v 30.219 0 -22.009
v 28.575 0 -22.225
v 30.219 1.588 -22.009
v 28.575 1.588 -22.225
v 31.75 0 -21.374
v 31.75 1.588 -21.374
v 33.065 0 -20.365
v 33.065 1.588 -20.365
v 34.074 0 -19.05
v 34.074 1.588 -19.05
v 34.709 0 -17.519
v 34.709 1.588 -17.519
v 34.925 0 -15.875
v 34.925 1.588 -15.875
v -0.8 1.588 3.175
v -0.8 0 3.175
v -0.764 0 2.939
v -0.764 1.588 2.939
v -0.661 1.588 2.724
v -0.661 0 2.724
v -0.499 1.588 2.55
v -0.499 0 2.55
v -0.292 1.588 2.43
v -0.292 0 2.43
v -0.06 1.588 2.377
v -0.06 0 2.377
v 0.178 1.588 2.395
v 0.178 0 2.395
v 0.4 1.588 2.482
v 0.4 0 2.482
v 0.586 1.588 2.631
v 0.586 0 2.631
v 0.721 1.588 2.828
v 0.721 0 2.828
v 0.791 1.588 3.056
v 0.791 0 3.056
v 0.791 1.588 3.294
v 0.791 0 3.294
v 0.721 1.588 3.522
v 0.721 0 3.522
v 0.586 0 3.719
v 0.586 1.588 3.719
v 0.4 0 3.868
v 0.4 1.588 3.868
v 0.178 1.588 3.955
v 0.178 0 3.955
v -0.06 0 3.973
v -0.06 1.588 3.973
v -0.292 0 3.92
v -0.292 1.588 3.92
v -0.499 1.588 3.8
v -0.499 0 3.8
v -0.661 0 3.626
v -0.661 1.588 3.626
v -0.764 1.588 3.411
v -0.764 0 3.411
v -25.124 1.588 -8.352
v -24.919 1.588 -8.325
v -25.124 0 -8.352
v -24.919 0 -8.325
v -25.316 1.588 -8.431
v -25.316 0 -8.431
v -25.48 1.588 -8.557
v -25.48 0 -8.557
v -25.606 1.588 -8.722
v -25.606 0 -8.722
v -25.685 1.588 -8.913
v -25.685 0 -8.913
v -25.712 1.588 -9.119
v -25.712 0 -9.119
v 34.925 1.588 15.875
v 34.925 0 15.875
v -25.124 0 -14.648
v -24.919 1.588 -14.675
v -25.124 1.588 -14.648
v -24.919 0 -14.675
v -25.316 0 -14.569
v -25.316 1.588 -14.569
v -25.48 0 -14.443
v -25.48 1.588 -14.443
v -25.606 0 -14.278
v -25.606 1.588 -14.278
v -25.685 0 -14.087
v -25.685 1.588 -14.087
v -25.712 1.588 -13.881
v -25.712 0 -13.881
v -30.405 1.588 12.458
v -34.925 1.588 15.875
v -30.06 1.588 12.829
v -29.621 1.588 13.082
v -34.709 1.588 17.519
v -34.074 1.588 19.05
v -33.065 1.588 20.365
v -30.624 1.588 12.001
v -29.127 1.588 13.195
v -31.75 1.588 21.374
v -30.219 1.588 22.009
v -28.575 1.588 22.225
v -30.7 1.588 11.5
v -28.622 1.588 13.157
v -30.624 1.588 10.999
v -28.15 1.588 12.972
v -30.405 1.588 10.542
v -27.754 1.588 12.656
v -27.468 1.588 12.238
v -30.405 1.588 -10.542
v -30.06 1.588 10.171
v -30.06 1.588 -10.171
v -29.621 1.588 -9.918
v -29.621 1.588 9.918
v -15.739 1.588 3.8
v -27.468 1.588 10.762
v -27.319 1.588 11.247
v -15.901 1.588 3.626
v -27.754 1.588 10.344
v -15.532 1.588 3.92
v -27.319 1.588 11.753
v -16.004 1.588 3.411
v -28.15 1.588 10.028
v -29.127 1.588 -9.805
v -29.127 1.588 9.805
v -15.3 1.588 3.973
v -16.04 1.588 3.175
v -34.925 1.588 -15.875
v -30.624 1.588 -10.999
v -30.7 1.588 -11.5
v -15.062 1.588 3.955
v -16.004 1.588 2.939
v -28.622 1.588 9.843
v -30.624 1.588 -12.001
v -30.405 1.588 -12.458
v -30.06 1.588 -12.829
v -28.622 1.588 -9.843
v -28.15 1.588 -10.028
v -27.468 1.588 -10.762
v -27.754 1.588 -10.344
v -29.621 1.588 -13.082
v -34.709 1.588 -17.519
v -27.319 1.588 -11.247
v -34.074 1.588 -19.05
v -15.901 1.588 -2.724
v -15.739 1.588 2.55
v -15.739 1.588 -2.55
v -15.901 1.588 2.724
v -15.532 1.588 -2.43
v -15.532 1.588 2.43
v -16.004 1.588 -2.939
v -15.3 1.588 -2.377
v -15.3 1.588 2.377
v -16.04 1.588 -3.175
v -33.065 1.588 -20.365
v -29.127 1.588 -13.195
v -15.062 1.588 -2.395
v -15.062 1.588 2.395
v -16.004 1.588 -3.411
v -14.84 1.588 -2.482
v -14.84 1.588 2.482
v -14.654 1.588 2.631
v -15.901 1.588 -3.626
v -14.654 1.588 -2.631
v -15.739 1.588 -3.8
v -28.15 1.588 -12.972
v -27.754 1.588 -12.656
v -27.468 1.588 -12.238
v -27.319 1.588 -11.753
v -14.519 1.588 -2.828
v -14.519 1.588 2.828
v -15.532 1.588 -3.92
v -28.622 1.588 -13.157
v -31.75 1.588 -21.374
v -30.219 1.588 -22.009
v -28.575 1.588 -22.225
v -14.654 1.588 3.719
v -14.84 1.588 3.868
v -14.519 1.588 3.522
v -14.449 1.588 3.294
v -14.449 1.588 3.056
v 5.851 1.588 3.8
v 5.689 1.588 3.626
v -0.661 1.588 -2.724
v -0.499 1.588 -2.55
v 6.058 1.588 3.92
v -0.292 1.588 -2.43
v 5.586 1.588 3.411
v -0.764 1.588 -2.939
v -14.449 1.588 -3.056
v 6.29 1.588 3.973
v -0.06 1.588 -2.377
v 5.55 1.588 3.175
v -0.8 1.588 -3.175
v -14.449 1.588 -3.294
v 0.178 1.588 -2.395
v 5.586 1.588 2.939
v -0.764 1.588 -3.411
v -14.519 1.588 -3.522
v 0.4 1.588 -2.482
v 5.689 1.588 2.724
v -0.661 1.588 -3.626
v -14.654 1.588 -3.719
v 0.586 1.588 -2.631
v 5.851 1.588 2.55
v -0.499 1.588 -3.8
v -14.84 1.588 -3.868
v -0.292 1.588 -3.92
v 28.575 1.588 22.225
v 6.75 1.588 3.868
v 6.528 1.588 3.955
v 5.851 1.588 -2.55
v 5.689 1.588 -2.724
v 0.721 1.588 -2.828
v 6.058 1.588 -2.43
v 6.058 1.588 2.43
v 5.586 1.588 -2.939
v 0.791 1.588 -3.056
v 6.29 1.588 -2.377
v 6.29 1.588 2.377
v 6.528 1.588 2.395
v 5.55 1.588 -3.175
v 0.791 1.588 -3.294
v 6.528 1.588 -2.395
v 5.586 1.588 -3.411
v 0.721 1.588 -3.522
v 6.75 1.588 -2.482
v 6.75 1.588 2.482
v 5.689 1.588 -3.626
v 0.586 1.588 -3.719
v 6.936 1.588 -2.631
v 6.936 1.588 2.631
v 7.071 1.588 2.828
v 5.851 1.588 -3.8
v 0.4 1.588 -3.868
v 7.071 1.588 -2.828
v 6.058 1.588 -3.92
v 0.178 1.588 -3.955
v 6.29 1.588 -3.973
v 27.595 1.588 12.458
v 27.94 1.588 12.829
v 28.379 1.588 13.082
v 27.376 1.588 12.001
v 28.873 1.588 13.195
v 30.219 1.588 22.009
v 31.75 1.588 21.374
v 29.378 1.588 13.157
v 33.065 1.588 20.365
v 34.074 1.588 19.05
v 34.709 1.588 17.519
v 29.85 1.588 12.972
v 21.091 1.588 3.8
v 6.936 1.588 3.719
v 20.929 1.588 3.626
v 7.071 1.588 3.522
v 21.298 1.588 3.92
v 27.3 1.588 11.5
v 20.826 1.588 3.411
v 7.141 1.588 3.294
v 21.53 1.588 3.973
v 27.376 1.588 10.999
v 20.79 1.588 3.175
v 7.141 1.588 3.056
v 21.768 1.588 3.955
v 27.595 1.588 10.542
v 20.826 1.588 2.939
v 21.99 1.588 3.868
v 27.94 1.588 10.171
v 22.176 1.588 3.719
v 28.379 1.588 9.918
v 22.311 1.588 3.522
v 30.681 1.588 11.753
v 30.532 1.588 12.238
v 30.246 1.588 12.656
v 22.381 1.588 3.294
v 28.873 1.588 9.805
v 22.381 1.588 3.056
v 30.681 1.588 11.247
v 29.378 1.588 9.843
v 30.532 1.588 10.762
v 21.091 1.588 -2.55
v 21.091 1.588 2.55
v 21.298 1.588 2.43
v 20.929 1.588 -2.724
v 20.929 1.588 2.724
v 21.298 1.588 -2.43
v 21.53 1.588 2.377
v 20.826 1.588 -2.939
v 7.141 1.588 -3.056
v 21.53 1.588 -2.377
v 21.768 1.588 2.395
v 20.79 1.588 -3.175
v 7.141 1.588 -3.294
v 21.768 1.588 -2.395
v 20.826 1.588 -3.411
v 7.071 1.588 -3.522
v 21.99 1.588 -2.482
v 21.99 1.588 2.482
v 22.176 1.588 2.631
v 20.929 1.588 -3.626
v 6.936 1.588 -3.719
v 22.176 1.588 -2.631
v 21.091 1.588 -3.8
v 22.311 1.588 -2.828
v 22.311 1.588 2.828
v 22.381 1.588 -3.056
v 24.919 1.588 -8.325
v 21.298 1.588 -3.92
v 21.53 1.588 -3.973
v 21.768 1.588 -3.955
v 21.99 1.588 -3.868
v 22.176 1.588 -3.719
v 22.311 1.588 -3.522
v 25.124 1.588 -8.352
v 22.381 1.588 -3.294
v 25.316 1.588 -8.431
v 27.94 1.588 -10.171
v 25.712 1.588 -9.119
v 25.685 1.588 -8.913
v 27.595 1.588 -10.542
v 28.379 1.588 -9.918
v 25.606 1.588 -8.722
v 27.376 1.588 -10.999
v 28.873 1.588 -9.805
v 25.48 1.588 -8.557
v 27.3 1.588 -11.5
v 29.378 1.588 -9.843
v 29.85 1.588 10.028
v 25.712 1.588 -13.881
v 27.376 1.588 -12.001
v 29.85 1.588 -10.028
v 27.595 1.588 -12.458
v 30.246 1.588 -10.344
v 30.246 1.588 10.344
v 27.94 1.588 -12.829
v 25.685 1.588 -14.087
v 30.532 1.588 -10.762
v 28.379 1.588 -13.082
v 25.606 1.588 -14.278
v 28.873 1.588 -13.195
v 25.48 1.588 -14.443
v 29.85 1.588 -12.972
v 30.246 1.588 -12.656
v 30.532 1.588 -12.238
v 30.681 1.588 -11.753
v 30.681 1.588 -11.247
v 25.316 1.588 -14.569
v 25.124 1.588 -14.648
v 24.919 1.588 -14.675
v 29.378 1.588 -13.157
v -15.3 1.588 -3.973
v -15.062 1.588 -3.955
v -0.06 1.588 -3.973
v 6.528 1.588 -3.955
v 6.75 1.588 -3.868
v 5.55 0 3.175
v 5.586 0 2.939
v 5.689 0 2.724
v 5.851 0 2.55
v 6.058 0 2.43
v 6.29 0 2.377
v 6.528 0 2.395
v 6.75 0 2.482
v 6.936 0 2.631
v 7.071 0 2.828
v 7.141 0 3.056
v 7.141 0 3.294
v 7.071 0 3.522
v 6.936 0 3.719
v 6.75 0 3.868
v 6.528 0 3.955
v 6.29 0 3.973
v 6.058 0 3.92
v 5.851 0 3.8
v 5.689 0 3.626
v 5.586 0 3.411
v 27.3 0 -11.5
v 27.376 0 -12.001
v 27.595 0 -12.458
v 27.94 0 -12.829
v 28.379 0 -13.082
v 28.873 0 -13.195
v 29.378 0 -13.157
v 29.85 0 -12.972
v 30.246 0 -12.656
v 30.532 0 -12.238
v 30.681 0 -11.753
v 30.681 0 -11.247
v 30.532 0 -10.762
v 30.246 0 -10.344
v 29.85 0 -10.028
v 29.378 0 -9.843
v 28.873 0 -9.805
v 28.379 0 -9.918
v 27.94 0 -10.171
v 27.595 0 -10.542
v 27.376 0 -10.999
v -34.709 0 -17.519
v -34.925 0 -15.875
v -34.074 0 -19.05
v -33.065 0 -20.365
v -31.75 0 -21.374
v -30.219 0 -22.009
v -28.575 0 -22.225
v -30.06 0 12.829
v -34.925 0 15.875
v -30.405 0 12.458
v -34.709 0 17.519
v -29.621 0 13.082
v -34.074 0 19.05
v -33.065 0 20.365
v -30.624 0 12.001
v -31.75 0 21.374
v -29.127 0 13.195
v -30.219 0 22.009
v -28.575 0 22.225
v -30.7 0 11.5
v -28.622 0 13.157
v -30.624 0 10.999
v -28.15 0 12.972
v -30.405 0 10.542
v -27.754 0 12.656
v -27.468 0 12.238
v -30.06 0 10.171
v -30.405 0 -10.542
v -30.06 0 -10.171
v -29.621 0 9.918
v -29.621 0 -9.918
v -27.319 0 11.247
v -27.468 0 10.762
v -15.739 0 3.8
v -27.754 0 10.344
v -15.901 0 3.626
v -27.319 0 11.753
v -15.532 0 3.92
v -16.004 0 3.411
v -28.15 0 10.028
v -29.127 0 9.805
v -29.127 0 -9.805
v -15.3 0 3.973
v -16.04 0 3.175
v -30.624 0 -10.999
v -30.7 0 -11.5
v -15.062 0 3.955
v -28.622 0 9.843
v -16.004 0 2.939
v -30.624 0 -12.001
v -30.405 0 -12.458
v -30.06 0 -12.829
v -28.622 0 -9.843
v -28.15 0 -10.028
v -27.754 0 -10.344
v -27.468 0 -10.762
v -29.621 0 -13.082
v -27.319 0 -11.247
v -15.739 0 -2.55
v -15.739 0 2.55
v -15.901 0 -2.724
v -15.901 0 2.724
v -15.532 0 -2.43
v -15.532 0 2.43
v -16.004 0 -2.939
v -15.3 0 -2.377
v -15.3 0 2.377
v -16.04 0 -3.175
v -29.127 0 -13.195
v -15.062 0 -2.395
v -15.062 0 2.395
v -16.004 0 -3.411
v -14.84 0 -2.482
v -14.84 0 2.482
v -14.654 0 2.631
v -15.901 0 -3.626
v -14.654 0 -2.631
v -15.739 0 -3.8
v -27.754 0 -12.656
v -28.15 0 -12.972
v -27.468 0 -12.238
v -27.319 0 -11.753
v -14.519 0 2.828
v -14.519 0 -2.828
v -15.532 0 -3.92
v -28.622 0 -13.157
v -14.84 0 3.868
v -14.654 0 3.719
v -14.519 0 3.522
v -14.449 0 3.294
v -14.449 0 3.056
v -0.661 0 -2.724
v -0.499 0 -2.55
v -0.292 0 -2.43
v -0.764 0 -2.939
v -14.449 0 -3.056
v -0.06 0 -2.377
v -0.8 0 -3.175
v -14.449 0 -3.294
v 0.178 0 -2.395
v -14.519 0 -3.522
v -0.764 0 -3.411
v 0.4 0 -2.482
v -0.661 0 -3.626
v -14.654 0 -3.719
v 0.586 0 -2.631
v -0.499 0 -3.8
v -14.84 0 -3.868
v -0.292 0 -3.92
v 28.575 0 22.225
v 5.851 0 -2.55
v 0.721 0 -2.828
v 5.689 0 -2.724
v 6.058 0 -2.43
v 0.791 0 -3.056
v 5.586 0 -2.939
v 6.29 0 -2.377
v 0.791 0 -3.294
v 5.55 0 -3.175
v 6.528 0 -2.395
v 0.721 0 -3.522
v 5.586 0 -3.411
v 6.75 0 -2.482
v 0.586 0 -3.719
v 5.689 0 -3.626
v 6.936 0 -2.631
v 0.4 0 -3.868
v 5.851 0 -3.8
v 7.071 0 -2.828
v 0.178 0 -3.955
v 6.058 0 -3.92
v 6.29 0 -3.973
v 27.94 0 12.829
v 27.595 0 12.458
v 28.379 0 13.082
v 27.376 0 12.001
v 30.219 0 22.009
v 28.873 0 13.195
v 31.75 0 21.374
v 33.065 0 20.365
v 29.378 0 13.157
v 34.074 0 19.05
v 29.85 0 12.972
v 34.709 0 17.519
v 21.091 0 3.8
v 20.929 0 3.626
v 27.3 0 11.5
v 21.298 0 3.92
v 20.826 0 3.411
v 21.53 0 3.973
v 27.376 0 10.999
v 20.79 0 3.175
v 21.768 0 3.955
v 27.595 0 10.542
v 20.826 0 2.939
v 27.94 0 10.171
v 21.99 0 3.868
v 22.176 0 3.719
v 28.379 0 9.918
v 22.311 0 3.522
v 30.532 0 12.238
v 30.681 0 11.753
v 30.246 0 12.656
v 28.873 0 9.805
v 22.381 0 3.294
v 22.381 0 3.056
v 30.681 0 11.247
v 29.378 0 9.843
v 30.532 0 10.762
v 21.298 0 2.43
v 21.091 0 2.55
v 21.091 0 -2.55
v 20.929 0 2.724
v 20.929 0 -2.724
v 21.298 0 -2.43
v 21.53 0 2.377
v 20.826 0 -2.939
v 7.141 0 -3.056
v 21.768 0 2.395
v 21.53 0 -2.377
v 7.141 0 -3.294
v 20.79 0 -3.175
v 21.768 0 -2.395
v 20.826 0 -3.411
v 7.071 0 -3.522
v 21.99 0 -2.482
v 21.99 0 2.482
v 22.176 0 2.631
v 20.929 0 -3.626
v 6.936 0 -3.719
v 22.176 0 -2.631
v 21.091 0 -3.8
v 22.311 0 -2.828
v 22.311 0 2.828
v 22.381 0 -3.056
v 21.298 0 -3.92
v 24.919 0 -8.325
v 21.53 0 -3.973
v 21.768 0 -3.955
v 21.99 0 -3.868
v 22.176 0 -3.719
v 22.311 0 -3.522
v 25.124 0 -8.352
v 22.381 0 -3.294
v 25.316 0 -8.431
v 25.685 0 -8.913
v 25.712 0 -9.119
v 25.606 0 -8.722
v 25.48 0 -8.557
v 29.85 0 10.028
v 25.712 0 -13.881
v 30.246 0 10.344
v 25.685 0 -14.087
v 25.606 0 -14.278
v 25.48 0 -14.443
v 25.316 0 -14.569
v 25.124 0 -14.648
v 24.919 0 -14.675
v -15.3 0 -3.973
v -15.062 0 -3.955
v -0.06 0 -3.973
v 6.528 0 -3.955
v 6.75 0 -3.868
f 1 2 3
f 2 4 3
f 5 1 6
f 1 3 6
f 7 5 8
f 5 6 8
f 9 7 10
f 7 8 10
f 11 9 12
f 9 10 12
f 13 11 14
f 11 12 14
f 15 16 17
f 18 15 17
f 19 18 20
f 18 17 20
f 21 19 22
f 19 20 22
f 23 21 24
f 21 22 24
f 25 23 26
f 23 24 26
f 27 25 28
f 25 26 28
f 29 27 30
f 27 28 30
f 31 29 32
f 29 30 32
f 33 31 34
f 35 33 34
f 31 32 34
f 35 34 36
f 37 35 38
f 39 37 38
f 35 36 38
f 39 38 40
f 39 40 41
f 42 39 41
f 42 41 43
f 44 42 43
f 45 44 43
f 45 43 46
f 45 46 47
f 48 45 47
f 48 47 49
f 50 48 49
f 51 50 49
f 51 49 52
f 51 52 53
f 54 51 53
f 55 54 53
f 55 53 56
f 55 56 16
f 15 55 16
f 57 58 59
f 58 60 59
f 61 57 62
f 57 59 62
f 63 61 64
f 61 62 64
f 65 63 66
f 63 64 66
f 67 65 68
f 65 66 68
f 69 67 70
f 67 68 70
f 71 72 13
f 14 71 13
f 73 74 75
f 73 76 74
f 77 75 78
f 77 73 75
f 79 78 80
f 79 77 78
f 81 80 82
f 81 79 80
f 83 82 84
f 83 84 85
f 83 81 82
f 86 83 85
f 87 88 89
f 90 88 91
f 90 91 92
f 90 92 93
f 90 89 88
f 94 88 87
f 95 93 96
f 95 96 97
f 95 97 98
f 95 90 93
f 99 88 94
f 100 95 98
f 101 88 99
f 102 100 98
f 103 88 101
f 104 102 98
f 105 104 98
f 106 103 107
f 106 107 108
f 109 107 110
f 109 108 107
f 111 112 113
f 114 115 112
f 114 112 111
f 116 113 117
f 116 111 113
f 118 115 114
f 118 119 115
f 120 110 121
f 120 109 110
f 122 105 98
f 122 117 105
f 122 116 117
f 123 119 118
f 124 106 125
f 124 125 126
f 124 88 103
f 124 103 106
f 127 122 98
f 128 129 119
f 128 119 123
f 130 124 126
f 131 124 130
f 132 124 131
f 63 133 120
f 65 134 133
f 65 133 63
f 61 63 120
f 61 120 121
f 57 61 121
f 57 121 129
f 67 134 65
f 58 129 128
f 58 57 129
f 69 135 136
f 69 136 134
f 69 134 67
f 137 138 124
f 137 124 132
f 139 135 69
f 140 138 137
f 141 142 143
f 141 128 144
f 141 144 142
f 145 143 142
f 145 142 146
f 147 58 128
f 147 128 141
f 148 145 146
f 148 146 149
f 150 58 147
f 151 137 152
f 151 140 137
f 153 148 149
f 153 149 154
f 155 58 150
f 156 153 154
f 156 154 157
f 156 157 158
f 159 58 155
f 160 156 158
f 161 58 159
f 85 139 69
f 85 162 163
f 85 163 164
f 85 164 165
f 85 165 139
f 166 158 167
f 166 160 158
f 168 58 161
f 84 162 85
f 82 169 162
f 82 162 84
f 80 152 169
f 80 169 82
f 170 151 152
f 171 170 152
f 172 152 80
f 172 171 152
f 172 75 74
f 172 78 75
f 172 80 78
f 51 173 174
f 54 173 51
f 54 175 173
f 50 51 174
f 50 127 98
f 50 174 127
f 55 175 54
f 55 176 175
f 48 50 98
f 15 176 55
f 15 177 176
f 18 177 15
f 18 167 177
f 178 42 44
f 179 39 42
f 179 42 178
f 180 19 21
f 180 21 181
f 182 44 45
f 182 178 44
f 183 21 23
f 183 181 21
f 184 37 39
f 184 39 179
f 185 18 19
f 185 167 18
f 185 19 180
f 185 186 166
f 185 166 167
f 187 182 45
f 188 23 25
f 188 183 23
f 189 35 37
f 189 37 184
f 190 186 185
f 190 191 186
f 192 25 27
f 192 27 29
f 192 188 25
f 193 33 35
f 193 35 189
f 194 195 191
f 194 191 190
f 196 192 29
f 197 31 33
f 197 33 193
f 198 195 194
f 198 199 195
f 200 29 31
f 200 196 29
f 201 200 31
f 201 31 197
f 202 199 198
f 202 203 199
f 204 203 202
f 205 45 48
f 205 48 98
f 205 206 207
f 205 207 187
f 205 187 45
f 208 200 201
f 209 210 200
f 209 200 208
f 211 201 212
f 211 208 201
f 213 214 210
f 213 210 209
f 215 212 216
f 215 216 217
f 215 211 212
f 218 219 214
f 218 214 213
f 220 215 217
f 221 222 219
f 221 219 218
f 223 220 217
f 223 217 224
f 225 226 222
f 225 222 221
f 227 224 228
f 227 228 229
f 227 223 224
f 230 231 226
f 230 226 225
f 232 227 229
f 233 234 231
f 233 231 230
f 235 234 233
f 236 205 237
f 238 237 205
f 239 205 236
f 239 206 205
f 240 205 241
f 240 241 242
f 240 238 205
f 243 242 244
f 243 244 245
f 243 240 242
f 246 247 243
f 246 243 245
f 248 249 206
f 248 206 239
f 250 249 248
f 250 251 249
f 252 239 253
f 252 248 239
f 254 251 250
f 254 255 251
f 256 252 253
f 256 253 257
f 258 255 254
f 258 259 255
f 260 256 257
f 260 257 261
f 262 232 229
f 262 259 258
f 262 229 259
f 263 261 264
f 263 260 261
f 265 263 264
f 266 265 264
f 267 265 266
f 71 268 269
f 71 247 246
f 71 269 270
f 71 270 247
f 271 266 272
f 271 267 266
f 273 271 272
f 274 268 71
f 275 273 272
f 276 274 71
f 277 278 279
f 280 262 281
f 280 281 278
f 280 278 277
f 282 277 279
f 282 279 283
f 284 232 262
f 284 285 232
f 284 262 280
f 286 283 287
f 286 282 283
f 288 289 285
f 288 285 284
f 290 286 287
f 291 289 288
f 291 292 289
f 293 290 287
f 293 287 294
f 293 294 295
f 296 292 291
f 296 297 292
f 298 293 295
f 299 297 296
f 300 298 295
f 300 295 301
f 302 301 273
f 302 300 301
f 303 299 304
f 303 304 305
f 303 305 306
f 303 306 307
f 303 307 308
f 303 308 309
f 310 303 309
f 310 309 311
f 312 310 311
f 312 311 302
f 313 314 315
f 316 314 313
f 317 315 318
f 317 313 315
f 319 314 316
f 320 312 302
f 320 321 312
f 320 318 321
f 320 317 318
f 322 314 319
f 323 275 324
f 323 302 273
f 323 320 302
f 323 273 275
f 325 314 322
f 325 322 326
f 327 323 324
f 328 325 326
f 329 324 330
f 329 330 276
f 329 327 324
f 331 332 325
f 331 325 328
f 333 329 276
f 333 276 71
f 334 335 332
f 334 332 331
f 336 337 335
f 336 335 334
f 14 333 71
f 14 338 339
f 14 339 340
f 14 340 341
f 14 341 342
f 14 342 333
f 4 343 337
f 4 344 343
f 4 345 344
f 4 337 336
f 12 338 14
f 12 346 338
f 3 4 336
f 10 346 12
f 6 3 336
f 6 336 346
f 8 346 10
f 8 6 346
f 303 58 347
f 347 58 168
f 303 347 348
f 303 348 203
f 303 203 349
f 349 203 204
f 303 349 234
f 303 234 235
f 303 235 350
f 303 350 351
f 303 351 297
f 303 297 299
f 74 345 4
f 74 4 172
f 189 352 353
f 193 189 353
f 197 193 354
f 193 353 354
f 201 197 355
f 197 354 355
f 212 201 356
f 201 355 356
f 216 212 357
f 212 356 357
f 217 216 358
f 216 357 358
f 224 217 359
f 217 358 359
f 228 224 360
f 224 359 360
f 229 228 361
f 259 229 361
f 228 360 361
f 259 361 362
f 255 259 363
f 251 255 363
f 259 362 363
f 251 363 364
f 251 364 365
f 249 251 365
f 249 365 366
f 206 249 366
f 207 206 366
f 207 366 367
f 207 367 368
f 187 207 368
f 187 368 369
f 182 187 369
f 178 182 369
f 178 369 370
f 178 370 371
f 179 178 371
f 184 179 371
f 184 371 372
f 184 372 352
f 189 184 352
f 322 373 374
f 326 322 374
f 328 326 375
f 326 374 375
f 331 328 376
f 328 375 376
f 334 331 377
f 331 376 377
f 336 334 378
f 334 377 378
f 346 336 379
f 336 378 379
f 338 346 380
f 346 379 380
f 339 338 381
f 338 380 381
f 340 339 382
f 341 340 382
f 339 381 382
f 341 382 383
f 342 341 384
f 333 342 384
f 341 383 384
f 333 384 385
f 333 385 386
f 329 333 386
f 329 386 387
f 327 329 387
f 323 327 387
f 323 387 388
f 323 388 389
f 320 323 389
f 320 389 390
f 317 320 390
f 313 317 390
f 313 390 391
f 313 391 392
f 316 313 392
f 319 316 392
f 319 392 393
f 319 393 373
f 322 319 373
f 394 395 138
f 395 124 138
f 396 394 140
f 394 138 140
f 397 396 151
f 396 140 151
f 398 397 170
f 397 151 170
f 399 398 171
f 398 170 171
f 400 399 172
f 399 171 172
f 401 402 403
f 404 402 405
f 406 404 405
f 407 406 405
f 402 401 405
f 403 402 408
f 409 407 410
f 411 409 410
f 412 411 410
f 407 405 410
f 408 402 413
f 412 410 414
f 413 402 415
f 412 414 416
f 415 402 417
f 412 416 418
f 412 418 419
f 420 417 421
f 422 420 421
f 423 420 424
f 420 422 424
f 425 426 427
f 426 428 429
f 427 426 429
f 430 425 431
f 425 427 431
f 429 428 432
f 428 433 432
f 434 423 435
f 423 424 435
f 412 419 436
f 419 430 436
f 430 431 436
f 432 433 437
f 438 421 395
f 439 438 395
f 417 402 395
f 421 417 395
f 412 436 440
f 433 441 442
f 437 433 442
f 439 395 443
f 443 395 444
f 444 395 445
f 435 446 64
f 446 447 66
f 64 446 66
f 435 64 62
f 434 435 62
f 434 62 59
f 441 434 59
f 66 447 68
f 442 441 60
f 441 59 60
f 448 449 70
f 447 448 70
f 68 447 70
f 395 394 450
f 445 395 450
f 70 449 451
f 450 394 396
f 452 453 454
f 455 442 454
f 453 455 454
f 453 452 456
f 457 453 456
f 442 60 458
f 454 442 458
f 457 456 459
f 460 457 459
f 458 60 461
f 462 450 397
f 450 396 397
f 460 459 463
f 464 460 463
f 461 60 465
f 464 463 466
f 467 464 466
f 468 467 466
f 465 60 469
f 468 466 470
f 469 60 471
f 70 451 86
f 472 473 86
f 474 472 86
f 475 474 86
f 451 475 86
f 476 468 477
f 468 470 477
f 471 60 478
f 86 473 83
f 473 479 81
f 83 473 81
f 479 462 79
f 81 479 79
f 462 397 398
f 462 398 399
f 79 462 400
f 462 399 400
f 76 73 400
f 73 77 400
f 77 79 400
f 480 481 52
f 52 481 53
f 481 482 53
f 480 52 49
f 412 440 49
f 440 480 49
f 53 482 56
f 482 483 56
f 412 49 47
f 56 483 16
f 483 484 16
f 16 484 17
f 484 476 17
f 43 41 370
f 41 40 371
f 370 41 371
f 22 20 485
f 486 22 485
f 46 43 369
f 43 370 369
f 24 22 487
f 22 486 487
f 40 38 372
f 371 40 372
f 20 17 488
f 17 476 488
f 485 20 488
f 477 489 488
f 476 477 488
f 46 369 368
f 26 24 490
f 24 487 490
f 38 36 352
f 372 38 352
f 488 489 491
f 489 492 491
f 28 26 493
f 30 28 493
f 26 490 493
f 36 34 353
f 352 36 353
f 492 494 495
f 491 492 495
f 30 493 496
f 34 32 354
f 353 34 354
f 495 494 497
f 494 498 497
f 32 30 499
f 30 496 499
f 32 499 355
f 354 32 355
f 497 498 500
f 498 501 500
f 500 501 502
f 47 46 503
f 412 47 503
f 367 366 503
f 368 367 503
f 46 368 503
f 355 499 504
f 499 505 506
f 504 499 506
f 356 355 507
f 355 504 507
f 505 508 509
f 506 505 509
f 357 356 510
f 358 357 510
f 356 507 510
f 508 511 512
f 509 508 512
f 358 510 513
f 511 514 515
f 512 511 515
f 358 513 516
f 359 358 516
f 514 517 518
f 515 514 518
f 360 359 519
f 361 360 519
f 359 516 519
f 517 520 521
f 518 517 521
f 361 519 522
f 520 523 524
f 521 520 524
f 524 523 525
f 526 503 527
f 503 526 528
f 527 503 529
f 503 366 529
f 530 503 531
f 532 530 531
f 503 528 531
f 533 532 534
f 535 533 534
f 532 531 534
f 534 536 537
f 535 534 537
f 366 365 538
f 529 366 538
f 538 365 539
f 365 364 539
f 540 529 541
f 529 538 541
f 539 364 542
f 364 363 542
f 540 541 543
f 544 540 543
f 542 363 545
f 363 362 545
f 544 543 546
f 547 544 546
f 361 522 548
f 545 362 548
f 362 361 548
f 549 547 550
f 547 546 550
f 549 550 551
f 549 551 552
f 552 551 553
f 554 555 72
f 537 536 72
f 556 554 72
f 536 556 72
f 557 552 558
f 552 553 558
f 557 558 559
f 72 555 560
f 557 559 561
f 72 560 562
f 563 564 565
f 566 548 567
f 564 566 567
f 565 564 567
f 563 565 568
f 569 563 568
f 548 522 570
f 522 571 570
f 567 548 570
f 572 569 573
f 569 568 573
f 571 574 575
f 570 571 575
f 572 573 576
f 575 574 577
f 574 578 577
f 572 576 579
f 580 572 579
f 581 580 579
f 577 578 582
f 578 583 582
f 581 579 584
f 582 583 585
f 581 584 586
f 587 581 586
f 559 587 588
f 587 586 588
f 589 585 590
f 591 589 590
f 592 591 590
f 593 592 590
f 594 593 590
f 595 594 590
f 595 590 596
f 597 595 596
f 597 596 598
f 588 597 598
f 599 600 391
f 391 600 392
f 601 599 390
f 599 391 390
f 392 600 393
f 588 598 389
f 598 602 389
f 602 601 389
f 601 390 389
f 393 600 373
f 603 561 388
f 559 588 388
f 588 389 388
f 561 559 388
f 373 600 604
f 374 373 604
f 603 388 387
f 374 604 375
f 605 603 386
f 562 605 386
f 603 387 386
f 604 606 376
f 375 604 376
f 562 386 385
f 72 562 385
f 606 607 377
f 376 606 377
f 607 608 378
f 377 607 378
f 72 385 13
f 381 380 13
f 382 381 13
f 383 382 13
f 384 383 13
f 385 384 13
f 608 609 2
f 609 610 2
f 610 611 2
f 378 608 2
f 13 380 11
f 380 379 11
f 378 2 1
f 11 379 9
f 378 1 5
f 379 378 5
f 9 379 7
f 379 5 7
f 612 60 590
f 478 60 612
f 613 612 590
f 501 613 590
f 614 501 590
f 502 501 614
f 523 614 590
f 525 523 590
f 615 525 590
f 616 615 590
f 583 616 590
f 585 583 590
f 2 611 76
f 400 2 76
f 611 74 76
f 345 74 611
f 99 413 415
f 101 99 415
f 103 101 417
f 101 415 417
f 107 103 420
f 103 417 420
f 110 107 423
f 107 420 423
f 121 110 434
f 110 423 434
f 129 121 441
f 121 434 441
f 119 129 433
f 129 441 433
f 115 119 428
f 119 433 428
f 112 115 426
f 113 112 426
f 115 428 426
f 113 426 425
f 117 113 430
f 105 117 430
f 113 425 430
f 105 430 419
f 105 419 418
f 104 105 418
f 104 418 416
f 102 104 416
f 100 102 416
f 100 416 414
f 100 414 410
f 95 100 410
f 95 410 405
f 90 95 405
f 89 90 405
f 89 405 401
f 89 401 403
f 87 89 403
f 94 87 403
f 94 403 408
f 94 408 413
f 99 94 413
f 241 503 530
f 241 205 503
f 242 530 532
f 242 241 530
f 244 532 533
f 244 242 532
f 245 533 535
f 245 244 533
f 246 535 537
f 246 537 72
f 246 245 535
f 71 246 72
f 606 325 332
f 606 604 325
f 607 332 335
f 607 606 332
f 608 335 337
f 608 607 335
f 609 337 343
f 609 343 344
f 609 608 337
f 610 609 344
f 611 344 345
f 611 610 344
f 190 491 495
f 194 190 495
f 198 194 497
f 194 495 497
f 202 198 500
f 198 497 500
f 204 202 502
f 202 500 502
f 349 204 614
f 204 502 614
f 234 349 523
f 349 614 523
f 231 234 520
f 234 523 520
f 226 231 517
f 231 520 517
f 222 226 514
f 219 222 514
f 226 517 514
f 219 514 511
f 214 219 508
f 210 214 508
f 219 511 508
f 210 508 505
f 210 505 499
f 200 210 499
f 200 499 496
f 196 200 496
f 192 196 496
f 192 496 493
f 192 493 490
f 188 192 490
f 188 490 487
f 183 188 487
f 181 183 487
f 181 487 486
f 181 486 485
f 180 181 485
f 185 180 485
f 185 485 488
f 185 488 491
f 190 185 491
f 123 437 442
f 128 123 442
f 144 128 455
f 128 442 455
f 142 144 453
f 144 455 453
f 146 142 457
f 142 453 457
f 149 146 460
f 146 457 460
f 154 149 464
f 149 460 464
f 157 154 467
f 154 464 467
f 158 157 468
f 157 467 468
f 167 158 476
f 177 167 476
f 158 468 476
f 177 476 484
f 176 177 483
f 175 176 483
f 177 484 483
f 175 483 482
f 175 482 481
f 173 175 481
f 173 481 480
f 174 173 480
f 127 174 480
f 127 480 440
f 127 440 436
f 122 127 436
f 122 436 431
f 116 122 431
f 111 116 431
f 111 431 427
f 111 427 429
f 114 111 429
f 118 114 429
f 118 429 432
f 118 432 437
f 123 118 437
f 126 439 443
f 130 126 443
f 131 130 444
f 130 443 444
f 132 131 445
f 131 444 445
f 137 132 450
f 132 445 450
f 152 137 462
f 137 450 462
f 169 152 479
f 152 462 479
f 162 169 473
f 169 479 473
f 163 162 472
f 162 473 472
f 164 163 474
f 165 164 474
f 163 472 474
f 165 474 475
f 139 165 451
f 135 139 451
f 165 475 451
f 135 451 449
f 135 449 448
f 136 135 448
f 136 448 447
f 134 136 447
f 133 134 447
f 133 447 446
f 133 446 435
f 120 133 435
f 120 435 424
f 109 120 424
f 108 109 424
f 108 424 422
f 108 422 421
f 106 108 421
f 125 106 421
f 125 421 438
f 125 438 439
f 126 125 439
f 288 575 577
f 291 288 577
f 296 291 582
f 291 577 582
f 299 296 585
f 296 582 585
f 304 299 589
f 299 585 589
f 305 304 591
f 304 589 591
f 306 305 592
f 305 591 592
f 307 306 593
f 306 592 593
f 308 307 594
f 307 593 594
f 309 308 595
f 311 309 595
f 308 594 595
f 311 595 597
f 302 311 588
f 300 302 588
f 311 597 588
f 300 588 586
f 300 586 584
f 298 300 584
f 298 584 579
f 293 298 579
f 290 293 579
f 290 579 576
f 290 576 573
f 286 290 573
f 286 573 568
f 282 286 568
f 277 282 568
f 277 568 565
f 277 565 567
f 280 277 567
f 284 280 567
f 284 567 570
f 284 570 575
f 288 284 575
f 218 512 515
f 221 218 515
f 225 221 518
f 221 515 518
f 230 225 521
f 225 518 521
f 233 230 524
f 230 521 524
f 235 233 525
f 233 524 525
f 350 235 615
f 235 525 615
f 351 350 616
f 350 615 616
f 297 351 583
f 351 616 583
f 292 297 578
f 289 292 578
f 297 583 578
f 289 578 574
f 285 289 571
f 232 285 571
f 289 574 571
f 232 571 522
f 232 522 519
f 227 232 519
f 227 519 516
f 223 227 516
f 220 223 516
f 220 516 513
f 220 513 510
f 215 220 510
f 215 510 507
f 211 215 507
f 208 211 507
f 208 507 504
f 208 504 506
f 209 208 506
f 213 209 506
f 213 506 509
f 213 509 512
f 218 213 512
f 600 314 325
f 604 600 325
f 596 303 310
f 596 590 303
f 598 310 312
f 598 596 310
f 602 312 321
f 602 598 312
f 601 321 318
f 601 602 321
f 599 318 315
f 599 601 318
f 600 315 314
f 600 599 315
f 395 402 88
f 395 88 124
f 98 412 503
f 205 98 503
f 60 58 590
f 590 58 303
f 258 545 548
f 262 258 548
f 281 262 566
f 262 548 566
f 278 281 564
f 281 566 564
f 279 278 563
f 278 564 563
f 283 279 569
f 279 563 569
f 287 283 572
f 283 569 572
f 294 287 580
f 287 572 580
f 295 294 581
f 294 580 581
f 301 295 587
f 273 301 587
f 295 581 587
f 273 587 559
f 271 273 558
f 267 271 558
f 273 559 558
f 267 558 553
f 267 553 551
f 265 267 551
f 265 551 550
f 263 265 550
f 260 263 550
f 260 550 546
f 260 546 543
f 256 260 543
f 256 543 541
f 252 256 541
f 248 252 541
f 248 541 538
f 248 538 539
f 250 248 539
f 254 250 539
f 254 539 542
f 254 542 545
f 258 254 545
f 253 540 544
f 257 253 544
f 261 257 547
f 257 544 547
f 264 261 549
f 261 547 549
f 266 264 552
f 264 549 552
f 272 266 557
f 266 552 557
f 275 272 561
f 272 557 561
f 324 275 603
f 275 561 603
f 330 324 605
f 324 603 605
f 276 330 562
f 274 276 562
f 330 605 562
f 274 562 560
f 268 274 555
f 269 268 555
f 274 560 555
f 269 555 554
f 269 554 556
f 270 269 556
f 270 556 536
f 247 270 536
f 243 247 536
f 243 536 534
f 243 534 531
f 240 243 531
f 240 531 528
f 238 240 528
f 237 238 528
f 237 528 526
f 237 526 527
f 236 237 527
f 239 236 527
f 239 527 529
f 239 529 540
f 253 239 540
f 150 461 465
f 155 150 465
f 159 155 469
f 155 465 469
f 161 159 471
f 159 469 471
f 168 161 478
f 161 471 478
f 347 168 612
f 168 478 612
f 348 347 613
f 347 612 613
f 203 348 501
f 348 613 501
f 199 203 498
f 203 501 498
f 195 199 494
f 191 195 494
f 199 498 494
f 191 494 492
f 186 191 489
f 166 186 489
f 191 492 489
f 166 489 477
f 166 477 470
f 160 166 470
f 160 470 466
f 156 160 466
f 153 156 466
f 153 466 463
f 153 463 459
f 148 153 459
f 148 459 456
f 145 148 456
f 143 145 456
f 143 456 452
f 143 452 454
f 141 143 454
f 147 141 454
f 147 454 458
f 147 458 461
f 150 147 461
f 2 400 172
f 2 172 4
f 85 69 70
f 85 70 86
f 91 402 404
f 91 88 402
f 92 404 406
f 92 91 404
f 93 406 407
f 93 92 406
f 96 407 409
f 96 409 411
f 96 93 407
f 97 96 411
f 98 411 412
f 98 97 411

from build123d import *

# Parameters (mm, degrees)
SKETCH3_W                   = 69.85
SKETCH3_H                   = 44.45
BOSS_EXTRUDE1_DEPTH         = 1.5875
M3_CLEARANCE_HOLE1_D        = 3.4
TAP_DRILL_FOR_M2X0_4_TAP1_D = 1.6
FILLET1_R                   = 6.35
SKETCH8_W                   = 51.425
SKETCH8_H                   = 6.35
CUT_EXTRUDE1_DEPTH          = 2.5875
FILLET2_R                   = 0.79375


with BuildPart() as part:
    # Sketch3 → Boss-Extrude1 (new body)
    with BuildSketch(Plane(origin=(0, 0, 0), x_dir=(1, 0, 0), z_dir=(0, 1, 0))):
        Rectangle(SKETCH3_W, SKETCH3_H)
    extrude(amount=BOSS_EXTRUDE1_DEPTH)

    # M3 Clearance Hole1 (through all)
    with Locations(Plane(origin=(0, 1.5875, 0), x_dir=(1, 0, 0), z_dir=(0, 1, 0))):
        with Locations((-29, 11.5), (-29, -11.5), (29, -11.5), (29, 11.5)):
            Hole(M3_CLEARANCE_HOLE1_D / 2)

    # Tap Drill for M2x0.4 Tap1 (through all)
    with Locations(Plane(origin=(0, 1.5875, 0), x_dir=(1, 0, 0), z_dir=(0, 1, 0))):
        with Locations((21.59, -3.175), (-15.24, 3.175), (0, 3.175), (-15.24, -3.175), (0, -3.175), (6.35, 3.175), (21.59, 3.175), (6.35, -3.175)):
            Hole(TAP_DRILL_FOR_M2X0_4_TAP1_D / 2)

    # Fillet1
    fillet1_edges = [part.edges().sort_by_distance(p)[0] for p in [
        (34.925, 0.79375, 22.225),
        (-34.925, 0.79375, 22.225),
        (-34.925, 0.79375, -22.225),
        (34.925, 0.79375, -22.225),
    ]]
    fillet(fillet1_edges, radius=FILLET1_R)

    # Sketch8 → Cut-Extrude1 (cut, through all)
    with BuildSketch(Plane(origin=(0, 1.5875, 0), x_dir=(1, 0, 0), z_dir=(0, 1, 0))):
        with Locations((0, 11.5)):
            Rectangle(SKETCH8_W, SKETCH8_H)
    extrude(amount=-CUT_EXTRUDE1_DEPTH, mode=Mode.SUBTRACT)

    # Fillet2
    fillet2_edges = [part.edges().sort_by_distance(p)[0] for p in [
        (-25.7125, 0.79375, -8.325),
        (-25.7125, 0.79375, -14.675),
        (25.7125, 0.79375, -14.675),
        (25.7125, 0.79375, -8.325),
    ]]
    fillet(fillet2_edges, radius=FILLET2_R)


solid = part.part
